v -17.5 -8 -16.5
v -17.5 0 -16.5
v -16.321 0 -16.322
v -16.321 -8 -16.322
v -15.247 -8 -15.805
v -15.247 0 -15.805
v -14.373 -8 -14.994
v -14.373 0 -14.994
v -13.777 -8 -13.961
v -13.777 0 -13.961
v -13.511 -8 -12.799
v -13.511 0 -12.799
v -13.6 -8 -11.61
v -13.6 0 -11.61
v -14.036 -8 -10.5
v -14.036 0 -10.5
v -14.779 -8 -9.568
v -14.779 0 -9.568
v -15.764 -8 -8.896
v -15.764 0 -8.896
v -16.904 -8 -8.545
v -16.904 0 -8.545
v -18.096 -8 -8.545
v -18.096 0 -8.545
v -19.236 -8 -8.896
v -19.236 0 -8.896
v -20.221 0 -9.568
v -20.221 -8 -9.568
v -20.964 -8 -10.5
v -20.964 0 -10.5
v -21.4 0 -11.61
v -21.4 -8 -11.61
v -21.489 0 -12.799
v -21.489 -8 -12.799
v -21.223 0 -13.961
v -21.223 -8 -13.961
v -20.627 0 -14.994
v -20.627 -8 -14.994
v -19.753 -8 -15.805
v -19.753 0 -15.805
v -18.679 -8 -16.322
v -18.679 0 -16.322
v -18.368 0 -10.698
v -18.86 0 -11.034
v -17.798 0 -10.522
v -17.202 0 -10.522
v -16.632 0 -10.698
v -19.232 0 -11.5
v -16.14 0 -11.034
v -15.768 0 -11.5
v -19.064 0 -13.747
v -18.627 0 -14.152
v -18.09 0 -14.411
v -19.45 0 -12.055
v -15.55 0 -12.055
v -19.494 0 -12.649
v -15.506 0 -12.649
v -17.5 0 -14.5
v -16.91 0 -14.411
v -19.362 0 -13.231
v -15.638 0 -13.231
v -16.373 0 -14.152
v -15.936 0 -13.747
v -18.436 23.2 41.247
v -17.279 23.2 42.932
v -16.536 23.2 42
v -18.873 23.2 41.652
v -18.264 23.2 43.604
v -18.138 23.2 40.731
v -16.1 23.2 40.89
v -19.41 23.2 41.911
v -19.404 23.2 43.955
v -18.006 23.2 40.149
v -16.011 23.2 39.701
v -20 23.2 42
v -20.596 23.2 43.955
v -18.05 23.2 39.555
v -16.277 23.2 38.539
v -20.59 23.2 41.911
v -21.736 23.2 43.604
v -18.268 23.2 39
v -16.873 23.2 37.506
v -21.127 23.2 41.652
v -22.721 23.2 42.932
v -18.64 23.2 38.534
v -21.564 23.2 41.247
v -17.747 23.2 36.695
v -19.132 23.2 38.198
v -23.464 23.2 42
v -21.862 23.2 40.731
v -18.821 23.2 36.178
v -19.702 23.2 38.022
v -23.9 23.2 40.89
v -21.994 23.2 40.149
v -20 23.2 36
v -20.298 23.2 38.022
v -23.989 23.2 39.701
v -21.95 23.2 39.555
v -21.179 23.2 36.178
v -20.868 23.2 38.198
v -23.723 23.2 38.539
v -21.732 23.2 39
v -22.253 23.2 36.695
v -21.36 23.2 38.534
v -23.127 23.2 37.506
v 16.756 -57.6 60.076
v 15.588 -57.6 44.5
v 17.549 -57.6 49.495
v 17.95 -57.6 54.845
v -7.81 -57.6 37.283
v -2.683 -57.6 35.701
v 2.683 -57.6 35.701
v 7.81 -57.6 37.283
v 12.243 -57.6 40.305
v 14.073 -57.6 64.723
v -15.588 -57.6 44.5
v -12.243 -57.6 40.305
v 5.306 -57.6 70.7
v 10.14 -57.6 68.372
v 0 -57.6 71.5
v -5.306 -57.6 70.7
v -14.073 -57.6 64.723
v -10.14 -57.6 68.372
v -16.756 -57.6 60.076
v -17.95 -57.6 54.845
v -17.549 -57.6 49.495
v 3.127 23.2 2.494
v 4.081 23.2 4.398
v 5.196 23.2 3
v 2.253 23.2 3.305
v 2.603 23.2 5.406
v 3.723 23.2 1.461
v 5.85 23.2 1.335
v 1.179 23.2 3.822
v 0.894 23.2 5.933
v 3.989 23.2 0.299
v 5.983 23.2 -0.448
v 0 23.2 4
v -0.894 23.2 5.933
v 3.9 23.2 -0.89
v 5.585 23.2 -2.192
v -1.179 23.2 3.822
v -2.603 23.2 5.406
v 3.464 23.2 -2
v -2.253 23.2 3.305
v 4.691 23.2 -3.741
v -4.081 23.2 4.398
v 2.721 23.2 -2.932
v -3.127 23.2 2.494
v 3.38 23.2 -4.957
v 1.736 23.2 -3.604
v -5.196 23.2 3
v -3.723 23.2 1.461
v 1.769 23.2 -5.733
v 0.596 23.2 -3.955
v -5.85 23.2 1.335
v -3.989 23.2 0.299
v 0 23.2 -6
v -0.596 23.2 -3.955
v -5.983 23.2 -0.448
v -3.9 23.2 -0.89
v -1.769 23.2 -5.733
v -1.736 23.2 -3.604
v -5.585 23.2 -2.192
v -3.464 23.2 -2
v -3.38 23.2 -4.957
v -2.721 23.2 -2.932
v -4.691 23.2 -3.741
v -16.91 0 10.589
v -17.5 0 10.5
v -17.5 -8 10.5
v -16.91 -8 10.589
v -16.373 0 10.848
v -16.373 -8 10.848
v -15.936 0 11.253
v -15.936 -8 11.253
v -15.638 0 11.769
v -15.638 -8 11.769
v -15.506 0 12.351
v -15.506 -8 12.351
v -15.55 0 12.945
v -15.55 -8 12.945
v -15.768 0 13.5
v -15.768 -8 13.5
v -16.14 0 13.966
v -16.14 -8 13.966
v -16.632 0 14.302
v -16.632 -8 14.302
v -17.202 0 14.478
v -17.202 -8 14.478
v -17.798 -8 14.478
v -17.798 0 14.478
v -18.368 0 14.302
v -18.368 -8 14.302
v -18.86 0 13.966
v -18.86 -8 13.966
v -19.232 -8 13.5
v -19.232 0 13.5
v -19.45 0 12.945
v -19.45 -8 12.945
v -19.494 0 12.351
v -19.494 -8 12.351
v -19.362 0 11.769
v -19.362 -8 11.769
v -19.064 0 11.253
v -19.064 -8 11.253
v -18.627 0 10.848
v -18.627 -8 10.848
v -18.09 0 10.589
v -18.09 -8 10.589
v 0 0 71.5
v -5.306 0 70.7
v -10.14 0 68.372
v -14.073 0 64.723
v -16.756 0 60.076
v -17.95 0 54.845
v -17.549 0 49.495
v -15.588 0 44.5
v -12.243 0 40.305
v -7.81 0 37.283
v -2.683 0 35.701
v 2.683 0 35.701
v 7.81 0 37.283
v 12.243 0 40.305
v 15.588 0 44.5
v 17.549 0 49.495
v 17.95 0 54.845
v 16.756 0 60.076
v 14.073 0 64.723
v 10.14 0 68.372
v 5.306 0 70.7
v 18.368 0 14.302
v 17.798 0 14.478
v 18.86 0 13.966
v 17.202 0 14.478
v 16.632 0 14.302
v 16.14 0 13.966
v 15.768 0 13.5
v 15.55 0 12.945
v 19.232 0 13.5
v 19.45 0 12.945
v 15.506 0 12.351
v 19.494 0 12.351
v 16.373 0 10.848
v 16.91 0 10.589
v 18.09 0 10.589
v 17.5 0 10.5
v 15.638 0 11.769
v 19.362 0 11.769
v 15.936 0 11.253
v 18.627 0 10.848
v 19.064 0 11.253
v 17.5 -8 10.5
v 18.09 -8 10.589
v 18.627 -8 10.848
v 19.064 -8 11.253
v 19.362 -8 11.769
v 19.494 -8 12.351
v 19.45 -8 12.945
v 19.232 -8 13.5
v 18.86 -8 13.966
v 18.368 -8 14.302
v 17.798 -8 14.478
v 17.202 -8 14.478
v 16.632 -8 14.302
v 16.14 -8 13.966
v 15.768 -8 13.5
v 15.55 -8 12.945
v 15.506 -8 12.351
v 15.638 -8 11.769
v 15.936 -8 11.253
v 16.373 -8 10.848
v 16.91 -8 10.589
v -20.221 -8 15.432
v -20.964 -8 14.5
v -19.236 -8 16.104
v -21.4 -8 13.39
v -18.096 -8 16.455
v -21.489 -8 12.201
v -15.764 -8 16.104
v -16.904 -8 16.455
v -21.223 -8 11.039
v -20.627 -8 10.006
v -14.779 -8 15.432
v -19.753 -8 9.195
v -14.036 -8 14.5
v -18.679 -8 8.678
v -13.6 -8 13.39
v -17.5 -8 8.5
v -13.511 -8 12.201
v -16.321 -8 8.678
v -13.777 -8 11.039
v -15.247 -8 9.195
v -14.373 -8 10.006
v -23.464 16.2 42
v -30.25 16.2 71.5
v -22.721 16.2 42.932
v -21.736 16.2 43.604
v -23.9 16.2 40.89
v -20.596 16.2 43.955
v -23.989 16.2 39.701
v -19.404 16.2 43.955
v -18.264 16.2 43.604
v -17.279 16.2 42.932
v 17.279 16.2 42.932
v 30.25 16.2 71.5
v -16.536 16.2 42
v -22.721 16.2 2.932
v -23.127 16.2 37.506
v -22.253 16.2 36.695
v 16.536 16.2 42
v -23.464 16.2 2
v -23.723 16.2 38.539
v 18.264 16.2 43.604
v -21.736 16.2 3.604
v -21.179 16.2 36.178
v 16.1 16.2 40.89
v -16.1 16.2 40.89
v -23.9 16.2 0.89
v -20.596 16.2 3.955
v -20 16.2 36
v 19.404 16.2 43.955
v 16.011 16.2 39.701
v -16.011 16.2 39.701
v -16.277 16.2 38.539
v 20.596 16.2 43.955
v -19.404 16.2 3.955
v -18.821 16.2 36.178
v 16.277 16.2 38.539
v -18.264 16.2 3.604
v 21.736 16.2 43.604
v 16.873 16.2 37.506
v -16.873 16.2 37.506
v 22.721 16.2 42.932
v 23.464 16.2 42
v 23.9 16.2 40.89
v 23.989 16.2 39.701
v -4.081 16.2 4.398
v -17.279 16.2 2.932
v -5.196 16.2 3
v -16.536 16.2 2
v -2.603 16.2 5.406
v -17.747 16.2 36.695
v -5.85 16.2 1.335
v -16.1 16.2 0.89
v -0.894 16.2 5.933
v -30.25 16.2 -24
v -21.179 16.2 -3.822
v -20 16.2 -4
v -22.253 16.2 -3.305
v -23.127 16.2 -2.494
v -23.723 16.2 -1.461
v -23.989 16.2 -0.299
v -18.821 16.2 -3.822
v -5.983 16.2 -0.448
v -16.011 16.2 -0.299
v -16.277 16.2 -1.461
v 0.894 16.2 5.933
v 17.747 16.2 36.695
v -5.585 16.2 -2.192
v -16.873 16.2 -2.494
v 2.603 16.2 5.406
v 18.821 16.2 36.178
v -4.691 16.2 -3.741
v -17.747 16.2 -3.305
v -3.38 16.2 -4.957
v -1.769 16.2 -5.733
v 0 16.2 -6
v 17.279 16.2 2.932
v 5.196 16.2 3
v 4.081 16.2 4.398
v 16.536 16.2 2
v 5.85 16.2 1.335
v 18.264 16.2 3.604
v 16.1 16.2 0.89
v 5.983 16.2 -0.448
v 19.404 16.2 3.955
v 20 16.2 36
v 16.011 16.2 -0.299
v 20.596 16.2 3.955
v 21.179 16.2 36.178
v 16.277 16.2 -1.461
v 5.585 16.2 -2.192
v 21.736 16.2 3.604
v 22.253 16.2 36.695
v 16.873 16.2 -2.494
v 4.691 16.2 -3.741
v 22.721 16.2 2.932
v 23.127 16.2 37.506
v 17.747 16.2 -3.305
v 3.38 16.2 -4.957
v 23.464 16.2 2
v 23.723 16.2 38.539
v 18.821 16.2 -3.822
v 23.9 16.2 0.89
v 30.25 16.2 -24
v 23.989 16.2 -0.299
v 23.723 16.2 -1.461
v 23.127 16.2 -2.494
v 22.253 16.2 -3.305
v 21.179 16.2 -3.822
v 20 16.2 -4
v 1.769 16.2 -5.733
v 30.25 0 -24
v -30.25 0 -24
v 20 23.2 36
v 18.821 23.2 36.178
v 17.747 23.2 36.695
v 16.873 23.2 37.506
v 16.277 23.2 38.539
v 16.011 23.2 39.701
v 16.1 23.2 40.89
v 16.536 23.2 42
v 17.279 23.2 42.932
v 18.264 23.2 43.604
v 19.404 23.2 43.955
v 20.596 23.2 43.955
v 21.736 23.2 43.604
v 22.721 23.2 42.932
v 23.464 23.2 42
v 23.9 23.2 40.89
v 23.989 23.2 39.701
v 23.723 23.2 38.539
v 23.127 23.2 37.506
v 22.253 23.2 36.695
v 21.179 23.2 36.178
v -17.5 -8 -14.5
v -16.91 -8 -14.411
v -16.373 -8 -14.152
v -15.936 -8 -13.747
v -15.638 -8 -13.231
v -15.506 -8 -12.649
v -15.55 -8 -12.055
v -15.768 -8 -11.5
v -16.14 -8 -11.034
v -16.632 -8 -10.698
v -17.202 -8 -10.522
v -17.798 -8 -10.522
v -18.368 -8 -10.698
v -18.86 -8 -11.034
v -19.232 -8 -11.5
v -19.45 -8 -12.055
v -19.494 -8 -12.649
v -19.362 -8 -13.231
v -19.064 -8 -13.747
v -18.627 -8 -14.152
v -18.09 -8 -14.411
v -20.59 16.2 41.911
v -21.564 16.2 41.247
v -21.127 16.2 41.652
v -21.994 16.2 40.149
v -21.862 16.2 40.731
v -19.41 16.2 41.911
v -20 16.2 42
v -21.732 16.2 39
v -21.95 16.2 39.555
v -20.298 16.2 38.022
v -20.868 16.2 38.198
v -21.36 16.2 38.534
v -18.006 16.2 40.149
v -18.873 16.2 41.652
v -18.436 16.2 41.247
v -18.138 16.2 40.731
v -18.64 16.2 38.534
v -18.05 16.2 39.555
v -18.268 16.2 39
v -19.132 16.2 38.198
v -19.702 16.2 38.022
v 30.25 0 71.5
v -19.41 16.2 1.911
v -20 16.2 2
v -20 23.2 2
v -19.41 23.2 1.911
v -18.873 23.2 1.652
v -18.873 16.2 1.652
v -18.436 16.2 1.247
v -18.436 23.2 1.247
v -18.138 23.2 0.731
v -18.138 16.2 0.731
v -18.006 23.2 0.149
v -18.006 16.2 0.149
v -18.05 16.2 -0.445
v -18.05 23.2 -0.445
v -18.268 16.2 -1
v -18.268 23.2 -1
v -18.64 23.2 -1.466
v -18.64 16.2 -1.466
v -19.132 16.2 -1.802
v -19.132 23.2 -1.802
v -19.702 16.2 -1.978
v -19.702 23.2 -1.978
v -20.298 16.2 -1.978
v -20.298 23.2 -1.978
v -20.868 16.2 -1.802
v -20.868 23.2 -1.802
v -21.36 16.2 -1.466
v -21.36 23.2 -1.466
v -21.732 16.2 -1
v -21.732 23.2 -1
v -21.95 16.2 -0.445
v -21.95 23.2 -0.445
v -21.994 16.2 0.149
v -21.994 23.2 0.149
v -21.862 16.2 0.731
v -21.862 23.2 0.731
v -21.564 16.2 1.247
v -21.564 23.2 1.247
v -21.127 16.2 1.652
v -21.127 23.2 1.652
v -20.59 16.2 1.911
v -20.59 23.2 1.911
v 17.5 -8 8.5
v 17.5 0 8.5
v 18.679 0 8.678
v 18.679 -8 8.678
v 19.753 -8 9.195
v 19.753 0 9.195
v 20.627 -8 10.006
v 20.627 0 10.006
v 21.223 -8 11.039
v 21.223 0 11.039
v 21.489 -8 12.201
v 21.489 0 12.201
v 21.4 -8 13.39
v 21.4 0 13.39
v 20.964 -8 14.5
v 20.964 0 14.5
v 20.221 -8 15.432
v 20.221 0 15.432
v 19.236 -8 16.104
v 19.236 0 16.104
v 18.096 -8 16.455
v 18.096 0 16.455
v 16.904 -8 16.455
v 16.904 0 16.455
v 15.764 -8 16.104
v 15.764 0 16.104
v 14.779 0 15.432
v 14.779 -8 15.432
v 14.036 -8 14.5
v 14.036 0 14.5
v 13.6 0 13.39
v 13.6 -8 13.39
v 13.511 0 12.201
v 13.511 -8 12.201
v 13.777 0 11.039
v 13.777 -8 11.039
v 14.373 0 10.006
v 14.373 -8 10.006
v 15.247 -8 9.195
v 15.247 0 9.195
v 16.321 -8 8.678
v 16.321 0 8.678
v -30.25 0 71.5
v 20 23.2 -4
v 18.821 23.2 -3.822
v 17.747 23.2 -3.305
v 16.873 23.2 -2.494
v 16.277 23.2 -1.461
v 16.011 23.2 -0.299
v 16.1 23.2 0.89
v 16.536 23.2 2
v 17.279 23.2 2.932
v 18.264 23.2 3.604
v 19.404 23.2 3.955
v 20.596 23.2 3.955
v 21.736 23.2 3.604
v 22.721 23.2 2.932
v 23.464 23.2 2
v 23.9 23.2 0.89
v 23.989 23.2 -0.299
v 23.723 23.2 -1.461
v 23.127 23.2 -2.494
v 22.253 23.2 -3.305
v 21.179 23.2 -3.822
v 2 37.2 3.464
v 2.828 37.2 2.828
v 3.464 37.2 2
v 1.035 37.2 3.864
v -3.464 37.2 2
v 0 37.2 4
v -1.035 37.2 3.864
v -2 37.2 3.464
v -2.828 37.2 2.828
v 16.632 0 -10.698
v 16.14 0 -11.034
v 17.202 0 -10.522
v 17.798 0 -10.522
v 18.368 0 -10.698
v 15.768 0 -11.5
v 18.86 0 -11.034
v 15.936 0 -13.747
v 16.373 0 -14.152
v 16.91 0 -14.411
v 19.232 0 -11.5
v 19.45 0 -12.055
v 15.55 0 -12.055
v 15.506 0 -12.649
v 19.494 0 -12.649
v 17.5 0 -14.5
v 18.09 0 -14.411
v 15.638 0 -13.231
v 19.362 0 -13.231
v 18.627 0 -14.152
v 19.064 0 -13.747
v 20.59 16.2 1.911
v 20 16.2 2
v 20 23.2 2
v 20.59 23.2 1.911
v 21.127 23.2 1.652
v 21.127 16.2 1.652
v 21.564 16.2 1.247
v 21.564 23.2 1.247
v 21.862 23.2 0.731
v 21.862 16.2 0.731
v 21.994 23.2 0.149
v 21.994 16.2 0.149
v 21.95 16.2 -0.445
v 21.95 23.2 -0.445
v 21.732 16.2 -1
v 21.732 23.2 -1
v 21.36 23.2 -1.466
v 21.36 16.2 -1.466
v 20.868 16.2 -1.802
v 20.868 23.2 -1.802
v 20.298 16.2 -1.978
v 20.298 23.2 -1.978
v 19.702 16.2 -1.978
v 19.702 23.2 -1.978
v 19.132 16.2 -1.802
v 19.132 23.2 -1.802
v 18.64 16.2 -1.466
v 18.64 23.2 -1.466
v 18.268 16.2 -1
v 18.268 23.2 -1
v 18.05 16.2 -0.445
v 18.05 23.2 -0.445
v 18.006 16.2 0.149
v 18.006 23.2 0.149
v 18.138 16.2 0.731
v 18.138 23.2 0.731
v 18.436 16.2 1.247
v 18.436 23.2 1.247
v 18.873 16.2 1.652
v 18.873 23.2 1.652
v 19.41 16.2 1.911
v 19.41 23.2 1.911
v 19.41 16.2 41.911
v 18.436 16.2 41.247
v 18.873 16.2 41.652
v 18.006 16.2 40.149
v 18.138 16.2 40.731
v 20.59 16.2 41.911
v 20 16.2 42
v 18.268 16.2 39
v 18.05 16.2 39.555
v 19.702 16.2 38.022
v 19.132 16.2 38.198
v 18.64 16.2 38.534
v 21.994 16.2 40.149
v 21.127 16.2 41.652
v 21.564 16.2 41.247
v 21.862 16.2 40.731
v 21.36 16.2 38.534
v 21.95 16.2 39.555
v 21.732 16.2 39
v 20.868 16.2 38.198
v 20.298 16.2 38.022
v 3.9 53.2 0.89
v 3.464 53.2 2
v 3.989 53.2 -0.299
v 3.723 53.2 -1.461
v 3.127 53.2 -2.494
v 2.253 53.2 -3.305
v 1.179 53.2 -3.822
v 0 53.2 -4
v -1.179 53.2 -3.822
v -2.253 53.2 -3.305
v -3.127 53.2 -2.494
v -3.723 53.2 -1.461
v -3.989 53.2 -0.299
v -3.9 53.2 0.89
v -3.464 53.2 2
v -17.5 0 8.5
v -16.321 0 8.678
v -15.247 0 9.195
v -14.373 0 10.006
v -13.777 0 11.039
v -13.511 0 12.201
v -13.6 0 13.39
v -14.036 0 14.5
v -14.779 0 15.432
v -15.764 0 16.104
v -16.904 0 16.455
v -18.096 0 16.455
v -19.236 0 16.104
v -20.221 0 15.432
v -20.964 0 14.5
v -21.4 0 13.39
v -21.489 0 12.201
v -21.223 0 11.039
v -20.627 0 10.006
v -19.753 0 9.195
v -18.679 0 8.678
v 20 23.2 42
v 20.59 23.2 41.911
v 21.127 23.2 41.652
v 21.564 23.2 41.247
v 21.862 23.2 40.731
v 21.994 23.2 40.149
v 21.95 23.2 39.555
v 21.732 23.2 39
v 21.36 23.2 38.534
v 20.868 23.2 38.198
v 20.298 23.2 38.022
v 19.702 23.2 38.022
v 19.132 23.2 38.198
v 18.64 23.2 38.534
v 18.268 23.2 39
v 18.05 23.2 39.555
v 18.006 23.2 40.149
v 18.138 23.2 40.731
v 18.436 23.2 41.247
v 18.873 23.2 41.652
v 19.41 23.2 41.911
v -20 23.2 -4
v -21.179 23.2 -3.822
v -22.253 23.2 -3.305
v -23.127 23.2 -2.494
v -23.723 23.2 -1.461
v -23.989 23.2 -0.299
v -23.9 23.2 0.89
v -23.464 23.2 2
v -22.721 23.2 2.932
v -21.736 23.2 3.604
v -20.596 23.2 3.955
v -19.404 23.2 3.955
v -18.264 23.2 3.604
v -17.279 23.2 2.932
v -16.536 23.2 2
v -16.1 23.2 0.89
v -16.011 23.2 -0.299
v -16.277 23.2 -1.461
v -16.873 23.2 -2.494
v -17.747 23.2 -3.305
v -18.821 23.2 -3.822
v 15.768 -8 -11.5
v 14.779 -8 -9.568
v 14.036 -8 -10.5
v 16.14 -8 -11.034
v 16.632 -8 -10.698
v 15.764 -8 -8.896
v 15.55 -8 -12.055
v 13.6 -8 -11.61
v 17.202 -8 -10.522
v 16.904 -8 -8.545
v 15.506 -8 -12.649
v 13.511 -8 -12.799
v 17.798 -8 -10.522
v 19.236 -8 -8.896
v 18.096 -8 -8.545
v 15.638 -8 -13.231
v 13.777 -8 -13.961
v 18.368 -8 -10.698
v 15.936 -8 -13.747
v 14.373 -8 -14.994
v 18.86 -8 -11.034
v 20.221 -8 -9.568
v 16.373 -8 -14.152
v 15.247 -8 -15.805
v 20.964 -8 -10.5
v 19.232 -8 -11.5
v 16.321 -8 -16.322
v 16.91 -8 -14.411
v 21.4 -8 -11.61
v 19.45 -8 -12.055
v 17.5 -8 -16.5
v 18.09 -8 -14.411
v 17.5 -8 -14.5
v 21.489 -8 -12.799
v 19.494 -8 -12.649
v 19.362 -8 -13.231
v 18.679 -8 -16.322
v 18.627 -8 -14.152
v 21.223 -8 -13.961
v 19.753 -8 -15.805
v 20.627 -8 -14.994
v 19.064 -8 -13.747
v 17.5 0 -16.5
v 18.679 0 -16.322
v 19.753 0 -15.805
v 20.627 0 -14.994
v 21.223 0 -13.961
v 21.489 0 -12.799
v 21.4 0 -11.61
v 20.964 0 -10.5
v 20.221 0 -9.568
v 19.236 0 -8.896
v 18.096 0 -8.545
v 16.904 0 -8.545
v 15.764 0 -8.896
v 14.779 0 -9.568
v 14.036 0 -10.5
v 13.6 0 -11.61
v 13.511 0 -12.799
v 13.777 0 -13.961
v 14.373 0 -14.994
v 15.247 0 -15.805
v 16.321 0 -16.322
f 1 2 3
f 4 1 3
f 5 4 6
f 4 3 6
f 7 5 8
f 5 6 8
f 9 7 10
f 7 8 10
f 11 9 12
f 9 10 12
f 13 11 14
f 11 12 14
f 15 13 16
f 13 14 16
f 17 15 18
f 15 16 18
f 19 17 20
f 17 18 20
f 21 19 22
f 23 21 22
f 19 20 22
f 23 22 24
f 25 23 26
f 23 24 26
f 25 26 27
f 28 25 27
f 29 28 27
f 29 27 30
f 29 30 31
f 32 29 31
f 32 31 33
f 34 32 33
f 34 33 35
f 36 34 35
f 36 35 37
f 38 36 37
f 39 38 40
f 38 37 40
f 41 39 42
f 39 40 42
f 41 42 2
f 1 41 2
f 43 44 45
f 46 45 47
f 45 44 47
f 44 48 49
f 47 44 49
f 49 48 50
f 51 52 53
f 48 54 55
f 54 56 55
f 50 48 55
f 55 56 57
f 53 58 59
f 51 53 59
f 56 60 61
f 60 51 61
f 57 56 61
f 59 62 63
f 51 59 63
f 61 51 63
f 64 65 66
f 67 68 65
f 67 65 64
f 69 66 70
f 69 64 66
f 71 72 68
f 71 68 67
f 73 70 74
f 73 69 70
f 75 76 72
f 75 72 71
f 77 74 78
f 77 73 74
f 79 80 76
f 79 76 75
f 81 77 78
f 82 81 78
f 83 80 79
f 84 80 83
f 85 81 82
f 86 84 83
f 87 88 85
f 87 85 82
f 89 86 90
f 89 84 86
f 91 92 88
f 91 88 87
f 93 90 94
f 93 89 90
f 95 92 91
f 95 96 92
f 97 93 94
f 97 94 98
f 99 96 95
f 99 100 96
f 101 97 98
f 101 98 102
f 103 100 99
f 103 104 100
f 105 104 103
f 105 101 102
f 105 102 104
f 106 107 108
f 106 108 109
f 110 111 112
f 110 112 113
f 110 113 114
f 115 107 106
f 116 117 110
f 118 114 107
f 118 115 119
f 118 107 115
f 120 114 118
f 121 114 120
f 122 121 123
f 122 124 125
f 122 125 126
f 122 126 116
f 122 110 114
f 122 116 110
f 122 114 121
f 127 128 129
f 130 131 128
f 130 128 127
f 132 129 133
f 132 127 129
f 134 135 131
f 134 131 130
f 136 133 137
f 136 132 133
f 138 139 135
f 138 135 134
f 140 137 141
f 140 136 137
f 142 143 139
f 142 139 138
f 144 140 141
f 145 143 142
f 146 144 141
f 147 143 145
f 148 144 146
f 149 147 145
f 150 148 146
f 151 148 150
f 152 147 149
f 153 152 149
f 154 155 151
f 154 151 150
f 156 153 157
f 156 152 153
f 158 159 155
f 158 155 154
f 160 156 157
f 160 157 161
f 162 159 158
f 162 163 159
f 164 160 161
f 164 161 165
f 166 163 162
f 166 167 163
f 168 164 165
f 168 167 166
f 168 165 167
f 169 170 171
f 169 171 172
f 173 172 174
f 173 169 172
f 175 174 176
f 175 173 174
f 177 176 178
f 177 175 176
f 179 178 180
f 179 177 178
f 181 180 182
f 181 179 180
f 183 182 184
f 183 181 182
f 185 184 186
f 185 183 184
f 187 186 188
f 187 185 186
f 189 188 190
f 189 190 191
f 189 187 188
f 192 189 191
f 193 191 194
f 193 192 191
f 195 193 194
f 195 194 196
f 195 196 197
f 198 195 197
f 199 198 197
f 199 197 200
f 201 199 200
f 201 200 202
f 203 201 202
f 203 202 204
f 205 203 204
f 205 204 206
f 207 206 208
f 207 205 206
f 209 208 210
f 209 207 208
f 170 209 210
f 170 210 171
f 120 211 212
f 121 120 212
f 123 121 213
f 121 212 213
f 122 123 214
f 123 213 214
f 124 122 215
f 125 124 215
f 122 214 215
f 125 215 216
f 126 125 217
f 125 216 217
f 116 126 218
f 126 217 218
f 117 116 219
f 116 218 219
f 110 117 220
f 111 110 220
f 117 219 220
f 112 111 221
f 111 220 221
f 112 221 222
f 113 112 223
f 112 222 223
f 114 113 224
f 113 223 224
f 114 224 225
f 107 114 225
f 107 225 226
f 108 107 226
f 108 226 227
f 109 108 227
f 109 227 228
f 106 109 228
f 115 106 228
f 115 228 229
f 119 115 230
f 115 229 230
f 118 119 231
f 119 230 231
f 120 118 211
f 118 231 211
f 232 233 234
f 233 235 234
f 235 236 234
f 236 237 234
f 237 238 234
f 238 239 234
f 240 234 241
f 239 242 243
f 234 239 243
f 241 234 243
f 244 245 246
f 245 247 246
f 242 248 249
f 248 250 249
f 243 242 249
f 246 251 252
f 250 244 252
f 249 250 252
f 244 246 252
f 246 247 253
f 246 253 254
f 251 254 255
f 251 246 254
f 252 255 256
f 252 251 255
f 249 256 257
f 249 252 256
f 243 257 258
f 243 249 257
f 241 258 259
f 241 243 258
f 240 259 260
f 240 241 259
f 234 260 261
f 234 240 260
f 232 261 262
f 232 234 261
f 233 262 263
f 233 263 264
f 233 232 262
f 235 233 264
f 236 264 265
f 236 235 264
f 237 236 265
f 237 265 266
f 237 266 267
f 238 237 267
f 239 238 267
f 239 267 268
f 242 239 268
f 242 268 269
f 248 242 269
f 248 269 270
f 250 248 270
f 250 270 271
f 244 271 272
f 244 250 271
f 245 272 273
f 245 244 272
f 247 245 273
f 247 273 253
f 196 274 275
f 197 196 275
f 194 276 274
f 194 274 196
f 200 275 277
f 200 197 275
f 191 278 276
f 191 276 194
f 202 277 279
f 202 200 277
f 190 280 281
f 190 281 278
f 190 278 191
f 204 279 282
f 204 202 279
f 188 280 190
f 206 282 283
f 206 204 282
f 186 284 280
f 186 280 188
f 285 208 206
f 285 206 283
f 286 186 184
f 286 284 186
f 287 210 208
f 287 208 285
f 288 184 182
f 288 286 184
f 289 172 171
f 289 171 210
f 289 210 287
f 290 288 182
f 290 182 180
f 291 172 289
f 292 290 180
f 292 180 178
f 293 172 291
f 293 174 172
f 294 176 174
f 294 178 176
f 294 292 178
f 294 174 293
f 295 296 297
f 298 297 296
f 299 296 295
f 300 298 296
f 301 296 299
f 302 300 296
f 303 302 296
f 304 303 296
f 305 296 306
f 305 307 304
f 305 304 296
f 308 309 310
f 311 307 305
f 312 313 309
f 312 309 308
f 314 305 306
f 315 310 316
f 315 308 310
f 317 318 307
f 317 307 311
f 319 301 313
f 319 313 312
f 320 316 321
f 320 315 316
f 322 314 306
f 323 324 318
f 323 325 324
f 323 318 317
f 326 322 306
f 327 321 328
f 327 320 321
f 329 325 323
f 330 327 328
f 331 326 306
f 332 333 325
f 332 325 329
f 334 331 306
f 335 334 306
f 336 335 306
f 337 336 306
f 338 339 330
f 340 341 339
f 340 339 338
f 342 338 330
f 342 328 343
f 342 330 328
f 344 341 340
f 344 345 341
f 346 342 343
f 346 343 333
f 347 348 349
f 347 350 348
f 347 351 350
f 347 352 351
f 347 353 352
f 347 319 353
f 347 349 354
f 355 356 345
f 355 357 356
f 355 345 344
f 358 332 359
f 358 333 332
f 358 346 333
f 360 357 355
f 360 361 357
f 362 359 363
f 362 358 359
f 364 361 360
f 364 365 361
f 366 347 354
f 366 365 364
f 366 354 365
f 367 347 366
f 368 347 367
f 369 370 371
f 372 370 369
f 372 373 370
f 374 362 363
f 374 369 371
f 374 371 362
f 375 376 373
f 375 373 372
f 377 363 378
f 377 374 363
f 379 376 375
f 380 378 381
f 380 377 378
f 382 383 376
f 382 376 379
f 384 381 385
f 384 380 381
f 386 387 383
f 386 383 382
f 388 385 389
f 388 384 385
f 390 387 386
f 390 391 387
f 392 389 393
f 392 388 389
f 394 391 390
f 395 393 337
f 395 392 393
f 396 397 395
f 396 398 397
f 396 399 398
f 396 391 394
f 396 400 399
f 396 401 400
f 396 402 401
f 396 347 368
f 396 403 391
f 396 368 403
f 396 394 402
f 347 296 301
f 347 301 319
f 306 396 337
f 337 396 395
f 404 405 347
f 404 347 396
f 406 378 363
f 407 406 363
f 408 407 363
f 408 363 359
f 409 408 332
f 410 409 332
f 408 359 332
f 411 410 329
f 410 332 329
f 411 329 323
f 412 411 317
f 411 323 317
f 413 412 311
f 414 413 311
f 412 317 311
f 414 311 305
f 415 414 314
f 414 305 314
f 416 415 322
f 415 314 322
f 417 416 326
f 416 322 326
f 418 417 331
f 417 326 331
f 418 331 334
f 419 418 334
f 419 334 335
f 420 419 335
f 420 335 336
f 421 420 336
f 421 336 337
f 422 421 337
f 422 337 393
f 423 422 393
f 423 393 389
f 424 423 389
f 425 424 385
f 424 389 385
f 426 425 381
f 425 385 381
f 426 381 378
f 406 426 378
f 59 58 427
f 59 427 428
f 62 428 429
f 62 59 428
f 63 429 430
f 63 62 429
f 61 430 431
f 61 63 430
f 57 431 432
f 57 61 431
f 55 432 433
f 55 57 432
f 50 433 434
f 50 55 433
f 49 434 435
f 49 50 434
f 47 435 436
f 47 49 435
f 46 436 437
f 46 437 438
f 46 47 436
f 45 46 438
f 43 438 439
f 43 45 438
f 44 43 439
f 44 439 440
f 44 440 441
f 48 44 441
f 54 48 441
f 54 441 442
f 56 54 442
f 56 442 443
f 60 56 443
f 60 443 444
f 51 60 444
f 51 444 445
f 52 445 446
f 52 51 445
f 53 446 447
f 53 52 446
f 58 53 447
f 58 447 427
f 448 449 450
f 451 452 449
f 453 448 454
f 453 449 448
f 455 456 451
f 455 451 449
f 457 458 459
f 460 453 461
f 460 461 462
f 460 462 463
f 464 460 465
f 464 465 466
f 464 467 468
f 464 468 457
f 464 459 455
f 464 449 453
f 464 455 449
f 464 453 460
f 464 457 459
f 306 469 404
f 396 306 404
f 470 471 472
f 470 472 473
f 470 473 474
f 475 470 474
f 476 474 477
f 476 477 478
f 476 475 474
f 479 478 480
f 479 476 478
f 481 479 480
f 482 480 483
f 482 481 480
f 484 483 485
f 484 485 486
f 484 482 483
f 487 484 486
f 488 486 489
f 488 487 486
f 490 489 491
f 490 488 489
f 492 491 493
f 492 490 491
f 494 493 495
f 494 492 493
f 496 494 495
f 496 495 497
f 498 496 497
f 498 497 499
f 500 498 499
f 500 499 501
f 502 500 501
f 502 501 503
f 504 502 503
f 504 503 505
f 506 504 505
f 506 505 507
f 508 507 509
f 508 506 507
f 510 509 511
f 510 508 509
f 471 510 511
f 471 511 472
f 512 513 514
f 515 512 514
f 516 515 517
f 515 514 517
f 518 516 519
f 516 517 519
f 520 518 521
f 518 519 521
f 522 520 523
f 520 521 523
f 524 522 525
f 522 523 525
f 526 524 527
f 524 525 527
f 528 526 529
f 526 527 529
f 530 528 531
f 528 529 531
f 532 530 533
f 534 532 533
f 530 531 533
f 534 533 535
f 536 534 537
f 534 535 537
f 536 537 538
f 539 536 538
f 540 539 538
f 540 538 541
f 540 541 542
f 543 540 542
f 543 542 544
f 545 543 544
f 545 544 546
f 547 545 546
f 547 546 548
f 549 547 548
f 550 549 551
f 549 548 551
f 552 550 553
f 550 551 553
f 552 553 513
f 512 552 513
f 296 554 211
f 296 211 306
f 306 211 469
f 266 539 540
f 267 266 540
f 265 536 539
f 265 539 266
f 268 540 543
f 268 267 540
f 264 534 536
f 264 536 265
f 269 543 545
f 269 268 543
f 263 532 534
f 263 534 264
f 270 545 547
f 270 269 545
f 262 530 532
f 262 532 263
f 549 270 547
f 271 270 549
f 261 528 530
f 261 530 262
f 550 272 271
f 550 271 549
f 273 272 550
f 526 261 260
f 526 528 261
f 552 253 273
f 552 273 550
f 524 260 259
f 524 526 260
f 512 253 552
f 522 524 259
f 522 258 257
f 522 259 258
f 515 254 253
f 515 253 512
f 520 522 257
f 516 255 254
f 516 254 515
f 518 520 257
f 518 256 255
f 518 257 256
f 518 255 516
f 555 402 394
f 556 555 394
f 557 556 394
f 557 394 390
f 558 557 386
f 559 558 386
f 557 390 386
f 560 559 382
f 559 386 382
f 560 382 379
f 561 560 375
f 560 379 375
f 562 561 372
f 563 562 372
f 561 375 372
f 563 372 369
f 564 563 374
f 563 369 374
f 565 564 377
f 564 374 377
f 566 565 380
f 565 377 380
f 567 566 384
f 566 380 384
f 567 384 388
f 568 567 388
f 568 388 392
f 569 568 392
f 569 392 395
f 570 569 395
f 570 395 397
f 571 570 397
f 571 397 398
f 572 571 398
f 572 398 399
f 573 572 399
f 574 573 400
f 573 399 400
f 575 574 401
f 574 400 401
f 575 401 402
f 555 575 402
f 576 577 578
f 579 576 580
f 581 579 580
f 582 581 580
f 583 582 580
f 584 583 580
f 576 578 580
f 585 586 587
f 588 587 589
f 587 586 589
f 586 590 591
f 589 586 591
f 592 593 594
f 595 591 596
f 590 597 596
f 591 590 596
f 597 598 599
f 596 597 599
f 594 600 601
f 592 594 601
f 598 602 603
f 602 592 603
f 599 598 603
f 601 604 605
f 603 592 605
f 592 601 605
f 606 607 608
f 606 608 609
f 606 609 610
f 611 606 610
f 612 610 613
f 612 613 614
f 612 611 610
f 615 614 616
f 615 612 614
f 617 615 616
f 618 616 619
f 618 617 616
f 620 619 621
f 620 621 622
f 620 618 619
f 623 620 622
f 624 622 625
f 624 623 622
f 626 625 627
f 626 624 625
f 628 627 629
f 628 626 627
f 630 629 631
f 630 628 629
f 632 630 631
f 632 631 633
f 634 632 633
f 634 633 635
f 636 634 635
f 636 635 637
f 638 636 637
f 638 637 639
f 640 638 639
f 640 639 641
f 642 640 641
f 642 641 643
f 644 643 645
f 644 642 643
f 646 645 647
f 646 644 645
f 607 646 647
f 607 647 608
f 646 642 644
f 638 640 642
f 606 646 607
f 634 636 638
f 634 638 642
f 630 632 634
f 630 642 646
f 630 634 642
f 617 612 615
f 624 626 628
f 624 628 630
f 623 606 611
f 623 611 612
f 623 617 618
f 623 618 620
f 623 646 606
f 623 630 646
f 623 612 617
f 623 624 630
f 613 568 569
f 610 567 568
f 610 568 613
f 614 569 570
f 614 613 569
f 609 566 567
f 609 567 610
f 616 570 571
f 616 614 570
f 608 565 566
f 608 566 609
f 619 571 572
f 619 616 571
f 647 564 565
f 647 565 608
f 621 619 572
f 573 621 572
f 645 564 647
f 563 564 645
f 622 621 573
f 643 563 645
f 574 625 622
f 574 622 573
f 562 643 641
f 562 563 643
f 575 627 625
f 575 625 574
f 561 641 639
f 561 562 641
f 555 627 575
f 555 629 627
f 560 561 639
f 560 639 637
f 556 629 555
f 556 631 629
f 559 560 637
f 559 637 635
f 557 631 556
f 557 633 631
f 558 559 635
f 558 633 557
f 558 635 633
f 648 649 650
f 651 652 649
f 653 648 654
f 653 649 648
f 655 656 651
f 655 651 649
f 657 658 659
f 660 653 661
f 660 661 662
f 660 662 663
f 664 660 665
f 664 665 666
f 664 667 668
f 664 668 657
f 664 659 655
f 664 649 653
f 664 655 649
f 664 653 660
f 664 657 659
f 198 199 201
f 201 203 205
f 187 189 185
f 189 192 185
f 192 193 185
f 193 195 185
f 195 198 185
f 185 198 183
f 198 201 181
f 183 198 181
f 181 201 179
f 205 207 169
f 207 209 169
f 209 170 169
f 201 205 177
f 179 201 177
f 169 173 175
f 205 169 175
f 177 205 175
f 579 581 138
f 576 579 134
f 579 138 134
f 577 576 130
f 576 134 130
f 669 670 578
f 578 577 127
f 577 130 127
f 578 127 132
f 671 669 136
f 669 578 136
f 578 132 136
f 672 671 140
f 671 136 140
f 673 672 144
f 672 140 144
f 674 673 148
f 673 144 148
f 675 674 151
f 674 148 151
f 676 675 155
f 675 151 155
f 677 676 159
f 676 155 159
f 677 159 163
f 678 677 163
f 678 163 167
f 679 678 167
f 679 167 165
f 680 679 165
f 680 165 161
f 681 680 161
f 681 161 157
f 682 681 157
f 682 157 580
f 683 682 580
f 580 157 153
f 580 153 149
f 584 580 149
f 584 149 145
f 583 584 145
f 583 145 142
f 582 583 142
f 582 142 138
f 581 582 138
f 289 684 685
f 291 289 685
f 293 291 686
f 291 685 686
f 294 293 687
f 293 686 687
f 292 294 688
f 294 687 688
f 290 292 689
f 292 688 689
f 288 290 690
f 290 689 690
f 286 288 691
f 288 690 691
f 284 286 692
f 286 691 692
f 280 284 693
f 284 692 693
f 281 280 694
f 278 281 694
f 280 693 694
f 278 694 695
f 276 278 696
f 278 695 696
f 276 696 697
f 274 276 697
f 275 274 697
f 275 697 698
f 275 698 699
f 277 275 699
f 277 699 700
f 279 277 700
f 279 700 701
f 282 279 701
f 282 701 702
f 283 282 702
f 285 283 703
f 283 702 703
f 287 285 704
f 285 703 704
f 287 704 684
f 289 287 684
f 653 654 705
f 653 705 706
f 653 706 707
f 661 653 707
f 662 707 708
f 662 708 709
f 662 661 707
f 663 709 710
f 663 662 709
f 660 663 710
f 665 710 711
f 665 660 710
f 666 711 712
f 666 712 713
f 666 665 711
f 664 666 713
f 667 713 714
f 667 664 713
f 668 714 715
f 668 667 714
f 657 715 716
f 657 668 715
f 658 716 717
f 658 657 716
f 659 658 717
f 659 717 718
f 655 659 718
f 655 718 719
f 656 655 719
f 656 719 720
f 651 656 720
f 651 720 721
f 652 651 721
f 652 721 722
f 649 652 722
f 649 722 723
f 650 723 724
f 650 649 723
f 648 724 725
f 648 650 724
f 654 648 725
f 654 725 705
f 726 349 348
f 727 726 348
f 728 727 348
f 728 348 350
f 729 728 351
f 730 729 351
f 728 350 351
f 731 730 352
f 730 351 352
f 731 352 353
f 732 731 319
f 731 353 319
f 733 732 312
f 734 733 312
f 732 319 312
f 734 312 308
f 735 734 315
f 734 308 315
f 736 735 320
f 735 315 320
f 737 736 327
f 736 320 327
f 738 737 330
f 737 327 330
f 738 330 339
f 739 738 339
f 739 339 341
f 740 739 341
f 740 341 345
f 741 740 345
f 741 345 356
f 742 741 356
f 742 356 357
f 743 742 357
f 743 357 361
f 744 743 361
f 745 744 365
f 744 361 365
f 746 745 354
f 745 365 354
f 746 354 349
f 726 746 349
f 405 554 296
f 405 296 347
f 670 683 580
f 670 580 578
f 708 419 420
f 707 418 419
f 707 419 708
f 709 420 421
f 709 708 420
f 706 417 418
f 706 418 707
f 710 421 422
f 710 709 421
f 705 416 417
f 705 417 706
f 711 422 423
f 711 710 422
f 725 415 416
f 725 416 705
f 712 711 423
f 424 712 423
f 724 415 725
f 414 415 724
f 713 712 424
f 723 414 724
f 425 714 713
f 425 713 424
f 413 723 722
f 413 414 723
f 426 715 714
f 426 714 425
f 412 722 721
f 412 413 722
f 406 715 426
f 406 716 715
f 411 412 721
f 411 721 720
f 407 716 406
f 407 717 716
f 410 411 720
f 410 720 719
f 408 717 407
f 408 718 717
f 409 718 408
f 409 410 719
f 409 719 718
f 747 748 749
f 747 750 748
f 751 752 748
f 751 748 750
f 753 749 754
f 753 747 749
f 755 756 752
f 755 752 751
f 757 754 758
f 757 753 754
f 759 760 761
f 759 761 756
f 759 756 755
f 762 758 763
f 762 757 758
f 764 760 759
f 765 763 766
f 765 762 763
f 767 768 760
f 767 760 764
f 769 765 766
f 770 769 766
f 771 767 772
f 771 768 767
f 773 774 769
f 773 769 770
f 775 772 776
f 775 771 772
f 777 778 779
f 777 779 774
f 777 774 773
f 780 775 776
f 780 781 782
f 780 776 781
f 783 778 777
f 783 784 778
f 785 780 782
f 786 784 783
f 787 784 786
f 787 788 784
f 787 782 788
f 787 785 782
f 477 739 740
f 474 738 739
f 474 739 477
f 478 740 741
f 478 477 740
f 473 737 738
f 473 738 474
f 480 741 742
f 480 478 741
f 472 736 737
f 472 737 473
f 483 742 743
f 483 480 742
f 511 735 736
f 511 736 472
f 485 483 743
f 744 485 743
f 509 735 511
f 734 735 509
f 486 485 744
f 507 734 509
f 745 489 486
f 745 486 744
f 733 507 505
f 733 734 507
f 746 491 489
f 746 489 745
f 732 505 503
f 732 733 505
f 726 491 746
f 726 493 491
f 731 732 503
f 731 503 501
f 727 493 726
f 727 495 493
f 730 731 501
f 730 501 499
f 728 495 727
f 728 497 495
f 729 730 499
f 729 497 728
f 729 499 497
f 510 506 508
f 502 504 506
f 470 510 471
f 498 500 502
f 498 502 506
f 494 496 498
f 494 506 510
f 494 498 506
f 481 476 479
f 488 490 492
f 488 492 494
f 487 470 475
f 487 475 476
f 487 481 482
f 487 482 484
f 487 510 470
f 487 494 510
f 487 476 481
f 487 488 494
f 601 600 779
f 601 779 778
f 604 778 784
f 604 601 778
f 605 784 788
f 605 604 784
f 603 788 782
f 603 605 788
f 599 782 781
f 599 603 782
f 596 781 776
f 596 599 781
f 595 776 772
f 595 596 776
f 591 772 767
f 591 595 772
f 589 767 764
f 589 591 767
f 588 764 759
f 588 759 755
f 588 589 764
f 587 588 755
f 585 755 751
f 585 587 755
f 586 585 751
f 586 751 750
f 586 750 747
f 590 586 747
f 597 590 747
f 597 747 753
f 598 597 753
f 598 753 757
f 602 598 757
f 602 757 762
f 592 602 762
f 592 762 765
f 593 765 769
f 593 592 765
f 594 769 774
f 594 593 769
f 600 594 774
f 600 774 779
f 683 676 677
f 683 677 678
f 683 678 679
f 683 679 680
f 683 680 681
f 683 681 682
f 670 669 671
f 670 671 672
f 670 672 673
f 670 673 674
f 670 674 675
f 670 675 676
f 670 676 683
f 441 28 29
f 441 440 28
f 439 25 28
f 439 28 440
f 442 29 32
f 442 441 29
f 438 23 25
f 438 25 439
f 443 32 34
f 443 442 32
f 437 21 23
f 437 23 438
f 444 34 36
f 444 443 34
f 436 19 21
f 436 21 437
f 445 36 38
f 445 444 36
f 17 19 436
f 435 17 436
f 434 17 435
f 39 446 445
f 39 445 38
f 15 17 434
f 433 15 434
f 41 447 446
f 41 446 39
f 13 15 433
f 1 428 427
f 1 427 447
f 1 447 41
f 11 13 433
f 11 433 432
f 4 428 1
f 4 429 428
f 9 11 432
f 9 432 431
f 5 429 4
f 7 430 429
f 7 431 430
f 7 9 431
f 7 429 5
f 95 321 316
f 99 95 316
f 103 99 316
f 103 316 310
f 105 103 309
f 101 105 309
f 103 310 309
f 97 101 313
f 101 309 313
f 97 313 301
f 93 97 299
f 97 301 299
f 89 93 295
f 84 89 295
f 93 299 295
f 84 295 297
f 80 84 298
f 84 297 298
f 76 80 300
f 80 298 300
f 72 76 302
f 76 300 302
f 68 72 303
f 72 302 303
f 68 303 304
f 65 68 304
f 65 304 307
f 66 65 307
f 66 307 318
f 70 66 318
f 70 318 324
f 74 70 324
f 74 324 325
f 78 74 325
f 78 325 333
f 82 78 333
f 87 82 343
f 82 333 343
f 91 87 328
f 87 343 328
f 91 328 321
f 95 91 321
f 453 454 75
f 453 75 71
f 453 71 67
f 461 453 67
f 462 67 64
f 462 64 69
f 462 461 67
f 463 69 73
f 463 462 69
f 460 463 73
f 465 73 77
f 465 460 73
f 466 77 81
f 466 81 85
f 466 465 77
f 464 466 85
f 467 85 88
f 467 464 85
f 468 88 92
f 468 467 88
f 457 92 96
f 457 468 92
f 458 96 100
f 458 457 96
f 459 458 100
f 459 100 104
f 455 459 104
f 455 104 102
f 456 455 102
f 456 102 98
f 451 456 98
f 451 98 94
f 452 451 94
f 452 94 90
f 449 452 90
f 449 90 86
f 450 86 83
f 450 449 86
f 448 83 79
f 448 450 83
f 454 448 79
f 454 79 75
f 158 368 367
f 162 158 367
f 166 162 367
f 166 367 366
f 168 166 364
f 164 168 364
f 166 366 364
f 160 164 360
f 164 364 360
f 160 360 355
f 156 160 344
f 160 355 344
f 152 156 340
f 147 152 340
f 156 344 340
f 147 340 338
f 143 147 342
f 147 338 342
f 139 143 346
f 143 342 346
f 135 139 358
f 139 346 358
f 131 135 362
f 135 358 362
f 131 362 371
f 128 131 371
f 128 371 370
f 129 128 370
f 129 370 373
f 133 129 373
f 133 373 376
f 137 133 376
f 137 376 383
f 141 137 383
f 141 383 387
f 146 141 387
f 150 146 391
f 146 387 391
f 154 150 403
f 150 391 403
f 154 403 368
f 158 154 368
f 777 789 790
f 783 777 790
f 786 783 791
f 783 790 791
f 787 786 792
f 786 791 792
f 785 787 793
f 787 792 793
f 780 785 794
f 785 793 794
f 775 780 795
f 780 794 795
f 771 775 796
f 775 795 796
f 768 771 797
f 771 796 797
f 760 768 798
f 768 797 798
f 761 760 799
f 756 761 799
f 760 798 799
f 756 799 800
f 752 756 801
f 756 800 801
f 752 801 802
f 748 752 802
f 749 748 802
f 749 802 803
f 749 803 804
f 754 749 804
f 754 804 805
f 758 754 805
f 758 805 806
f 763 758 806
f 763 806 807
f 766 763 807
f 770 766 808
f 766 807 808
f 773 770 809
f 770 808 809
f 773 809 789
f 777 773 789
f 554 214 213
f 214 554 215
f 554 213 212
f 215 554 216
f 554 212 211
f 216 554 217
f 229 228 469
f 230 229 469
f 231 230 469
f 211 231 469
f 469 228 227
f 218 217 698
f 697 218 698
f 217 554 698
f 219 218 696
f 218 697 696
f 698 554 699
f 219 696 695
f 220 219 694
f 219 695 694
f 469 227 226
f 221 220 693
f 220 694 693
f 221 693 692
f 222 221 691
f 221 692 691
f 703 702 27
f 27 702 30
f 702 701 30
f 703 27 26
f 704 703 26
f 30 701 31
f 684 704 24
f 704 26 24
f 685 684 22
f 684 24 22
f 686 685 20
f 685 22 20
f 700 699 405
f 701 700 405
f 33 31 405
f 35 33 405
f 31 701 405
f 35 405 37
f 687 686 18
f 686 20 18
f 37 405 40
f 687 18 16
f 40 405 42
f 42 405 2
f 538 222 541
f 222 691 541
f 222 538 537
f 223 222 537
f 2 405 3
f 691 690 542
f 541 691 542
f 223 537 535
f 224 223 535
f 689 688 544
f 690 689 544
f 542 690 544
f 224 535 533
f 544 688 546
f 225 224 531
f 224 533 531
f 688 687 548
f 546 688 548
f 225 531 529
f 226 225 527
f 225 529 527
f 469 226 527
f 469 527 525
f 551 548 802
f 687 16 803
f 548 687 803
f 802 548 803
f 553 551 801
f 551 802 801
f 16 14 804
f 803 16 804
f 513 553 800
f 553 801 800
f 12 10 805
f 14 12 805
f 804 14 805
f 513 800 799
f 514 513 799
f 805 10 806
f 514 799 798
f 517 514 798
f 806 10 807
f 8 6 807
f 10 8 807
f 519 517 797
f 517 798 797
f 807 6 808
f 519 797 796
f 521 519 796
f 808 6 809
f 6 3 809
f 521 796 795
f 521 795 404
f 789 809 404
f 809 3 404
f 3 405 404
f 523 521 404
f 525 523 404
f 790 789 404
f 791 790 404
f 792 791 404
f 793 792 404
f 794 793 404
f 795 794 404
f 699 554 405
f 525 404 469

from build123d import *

# Parameters (mm, degrees)
SKETCH_1_W          = 60.5
SKETCH_1_H          = 95.5
EXTRUDE_1_DEPTH     = 16.2
SKETCH_2_R          = 6
SKETCH_2_R_2        = 4
SKETCH_2_R_3        = 2
EXTRUDE_2_DEPTH     = 7
SKETCH_3_R          = 4
EXTRUDE_3_DEPTH     = 30
CUT_EXTRUDE_START   = -16
CUT_EXTRUDE_1_DEPTH = 16
SKETCH_5_R          = 4
SKETCH_5_R_2        = 2
EXTRUDE_4_DEPTH     = 8
SKETCH_6_R          = 18
EXTRUDE_5_DEPTH     = 57.6


with BuildPart() as part:
    # 草图1 → 凸台-拉伸1 (new body)
    with BuildSketch(Plane(origin=(0, 0, 0), x_dir=(1, 0, 0), z_dir=(0, 1, 0))):
        with Locations((0, -23.75)):
            Rectangle(SKETCH_1_W, SKETCH_1_H)
    extrude(amount=EXTRUDE_1_DEPTH)

    # 草图2 → 凸台-拉伸2 (add)
    # profile 1 of 5: a face of its own
    with BuildSketch(Plane(origin=(0, 16.2, 0), x_dir=(1, 0, 0), z_dir=(0, 1, 0))):
        with Locations(Location((0, 0, 0), (0, 0, 90))):
            Circle(SKETCH_2_R)
    # profile 2 of 5: a face of its own
    with BuildSketch(Plane(origin=(0, 16.2, 0), x_dir=(1, 0, 0), z_dir=(0, 1, 0))):
        with Locations(Location((-20, 0, 0), (0, 0, 90))):
            Circle(SKETCH_2_R_2)
        with Locations(Location((-20, 0, 0), (0, 0, 270))):
            Circle(SKETCH_2_R_3, mode=Mode.SUBTRACT)
    # profile 3 of 5: a face of its own
    with BuildSketch(Plane(origin=(0, 16.2, 0), x_dir=(1, 0, 0), z_dir=(0, 1, 0))):
        with Locations(Location((20, 0, 0), (0, 0, 90))):
            Circle(SKETCH_2_R_2)
        with Locations(Location((20, 0, 0), (0, 0, 270))):
            Circle(SKETCH_2_R_3, mode=Mode.SUBTRACT)
    # profile 4 of 5: a face of its own
    with BuildSketch(Plane(origin=(0, 16.2, 0), x_dir=(1, 0, 0), z_dir=(0, 1, 0))):
        with Locations(Location((20, -40, 0), (0, 0, 90))):
            Circle(SKETCH_2_R_2)
        with Locations(Location((20, -40, 0), (0, 0, 270))):
            Circle(SKETCH_2_R_3, mode=Mode.SUBTRACT)
    # profile 5 of 5: a face of its own
    with BuildSketch(Plane(origin=(0, 16.2, 0), x_dir=(1, 0, 0), z_dir=(0, 1, 0))):
        with Locations(Location((-20, -40, 0), (0, 0, 90))):
            Circle(SKETCH_2_R_2)
        with Locations(Location((-20, -40, 0), (0, 0, 270))):
            Circle(SKETCH_2_R_3, mode=Mode.SUBTRACT)
    extrude(amount=EXTRUDE_2_DEPTH)

    # 草图3 → 凸台-拉伸3 (add)
    with BuildSketch(Plane(origin=(0, 23.2, 0), x_dir=(1, 0, 0), z_dir=(0, 1, 0))):
        with Locations(Location((0, 0, 0), (0, 0, 270))):
            Circle(SKETCH_3_R)
    extrude(amount=EXTRUDE_3_DEPTH)

    # 草图4 → 切除-拉伸1 (cut)
    with BuildSketch(Plane(origin=(0, 53.2, 0), x_dir=(1, 0, 0), z_dir=(0, 1, 0)).offset(CUT_EXTRUDE_START)):
        with BuildLine():
            Line((-3.464101615, -2), (3.464101615, -2))
            ThreePointArc((3.464101615, -2), (0, -4), (-3.464101615, -2))
        make_face()
    extrude(amount=CUT_EXTRUDE_1_DEPTH, mode=Mode.SUBTRACT)

    # 草图5 → 凸台-拉伸4 (add)
    # profile 1 of 4: a face of its own
    with BuildSketch(Plane(origin=(0, 0, 0), x_dir=(-1, 0, 0), z_dir=(0, -1, 0))):
        with Locations(Location((-17.5, 12.5, 0), (0, 0, 90))):
            Circle(SKETCH_5_R)
        with Locations(Location((-17.5, 12.5, 0), (0, 0, 90))):
            Circle(SKETCH_5_R_2, mode=Mode.SUBTRACT)
    # profile 2 of 4: a face of its own
    with BuildSketch(Plane(origin=(0, 0, 0), x_dir=(-1, 0, 0), z_dir=(0, -1, 0))):
        with Locations(Location((17.5, 12.5, 0), (0, 0, 90))):
            Circle(SKETCH_5_R)
        with Locations(Location((17.5, 12.5, 0), (0, 0, 90))):
            Circle(SKETCH_5_R_2, mode=Mode.SUBTRACT)
    # profile 3 of 4: a face of its own
    with BuildSketch(Plane(origin=(0, 0, 0), x_dir=(-1, 0, 0), z_dir=(0, -1, 0))):
        with Locations(Location((17.5, -12.5, 0), (0, 0, 90))):
            Circle(SKETCH_5_R)
        with Locations(Location((17.5, -12.5, 0), (0, 0, 90))):
            Circle(SKETCH_5_R_2, mode=Mode.SUBTRACT)
    # profile 4 of 4: a face of its own
    with BuildSketch(Plane(origin=(0, 0, 0), x_dir=(-1, 0, 0), z_dir=(0, -1, 0))):
        with Locations(Location((-17.5, -12.5, 0), (0, 0, 90))):
            Circle(SKETCH_5_R)
        with Locations(Location((-17.5, -12.5, 0), (0, 0, 90))):
            Circle(SKETCH_5_R_2, mode=Mode.SUBTRACT)
    extrude(amount=EXTRUDE_4_DEPTH)

    # 草图6 → 凸台-拉伸5 (add)
    with BuildSketch(Plane.XZ):
        with Locations(Location((0, 53.5, 0), (0, 0, 90))):
            Circle(SKETCH_6_R)
    extrude(amount=EXTRUDE_5_DEPTH)


solid = part.part
